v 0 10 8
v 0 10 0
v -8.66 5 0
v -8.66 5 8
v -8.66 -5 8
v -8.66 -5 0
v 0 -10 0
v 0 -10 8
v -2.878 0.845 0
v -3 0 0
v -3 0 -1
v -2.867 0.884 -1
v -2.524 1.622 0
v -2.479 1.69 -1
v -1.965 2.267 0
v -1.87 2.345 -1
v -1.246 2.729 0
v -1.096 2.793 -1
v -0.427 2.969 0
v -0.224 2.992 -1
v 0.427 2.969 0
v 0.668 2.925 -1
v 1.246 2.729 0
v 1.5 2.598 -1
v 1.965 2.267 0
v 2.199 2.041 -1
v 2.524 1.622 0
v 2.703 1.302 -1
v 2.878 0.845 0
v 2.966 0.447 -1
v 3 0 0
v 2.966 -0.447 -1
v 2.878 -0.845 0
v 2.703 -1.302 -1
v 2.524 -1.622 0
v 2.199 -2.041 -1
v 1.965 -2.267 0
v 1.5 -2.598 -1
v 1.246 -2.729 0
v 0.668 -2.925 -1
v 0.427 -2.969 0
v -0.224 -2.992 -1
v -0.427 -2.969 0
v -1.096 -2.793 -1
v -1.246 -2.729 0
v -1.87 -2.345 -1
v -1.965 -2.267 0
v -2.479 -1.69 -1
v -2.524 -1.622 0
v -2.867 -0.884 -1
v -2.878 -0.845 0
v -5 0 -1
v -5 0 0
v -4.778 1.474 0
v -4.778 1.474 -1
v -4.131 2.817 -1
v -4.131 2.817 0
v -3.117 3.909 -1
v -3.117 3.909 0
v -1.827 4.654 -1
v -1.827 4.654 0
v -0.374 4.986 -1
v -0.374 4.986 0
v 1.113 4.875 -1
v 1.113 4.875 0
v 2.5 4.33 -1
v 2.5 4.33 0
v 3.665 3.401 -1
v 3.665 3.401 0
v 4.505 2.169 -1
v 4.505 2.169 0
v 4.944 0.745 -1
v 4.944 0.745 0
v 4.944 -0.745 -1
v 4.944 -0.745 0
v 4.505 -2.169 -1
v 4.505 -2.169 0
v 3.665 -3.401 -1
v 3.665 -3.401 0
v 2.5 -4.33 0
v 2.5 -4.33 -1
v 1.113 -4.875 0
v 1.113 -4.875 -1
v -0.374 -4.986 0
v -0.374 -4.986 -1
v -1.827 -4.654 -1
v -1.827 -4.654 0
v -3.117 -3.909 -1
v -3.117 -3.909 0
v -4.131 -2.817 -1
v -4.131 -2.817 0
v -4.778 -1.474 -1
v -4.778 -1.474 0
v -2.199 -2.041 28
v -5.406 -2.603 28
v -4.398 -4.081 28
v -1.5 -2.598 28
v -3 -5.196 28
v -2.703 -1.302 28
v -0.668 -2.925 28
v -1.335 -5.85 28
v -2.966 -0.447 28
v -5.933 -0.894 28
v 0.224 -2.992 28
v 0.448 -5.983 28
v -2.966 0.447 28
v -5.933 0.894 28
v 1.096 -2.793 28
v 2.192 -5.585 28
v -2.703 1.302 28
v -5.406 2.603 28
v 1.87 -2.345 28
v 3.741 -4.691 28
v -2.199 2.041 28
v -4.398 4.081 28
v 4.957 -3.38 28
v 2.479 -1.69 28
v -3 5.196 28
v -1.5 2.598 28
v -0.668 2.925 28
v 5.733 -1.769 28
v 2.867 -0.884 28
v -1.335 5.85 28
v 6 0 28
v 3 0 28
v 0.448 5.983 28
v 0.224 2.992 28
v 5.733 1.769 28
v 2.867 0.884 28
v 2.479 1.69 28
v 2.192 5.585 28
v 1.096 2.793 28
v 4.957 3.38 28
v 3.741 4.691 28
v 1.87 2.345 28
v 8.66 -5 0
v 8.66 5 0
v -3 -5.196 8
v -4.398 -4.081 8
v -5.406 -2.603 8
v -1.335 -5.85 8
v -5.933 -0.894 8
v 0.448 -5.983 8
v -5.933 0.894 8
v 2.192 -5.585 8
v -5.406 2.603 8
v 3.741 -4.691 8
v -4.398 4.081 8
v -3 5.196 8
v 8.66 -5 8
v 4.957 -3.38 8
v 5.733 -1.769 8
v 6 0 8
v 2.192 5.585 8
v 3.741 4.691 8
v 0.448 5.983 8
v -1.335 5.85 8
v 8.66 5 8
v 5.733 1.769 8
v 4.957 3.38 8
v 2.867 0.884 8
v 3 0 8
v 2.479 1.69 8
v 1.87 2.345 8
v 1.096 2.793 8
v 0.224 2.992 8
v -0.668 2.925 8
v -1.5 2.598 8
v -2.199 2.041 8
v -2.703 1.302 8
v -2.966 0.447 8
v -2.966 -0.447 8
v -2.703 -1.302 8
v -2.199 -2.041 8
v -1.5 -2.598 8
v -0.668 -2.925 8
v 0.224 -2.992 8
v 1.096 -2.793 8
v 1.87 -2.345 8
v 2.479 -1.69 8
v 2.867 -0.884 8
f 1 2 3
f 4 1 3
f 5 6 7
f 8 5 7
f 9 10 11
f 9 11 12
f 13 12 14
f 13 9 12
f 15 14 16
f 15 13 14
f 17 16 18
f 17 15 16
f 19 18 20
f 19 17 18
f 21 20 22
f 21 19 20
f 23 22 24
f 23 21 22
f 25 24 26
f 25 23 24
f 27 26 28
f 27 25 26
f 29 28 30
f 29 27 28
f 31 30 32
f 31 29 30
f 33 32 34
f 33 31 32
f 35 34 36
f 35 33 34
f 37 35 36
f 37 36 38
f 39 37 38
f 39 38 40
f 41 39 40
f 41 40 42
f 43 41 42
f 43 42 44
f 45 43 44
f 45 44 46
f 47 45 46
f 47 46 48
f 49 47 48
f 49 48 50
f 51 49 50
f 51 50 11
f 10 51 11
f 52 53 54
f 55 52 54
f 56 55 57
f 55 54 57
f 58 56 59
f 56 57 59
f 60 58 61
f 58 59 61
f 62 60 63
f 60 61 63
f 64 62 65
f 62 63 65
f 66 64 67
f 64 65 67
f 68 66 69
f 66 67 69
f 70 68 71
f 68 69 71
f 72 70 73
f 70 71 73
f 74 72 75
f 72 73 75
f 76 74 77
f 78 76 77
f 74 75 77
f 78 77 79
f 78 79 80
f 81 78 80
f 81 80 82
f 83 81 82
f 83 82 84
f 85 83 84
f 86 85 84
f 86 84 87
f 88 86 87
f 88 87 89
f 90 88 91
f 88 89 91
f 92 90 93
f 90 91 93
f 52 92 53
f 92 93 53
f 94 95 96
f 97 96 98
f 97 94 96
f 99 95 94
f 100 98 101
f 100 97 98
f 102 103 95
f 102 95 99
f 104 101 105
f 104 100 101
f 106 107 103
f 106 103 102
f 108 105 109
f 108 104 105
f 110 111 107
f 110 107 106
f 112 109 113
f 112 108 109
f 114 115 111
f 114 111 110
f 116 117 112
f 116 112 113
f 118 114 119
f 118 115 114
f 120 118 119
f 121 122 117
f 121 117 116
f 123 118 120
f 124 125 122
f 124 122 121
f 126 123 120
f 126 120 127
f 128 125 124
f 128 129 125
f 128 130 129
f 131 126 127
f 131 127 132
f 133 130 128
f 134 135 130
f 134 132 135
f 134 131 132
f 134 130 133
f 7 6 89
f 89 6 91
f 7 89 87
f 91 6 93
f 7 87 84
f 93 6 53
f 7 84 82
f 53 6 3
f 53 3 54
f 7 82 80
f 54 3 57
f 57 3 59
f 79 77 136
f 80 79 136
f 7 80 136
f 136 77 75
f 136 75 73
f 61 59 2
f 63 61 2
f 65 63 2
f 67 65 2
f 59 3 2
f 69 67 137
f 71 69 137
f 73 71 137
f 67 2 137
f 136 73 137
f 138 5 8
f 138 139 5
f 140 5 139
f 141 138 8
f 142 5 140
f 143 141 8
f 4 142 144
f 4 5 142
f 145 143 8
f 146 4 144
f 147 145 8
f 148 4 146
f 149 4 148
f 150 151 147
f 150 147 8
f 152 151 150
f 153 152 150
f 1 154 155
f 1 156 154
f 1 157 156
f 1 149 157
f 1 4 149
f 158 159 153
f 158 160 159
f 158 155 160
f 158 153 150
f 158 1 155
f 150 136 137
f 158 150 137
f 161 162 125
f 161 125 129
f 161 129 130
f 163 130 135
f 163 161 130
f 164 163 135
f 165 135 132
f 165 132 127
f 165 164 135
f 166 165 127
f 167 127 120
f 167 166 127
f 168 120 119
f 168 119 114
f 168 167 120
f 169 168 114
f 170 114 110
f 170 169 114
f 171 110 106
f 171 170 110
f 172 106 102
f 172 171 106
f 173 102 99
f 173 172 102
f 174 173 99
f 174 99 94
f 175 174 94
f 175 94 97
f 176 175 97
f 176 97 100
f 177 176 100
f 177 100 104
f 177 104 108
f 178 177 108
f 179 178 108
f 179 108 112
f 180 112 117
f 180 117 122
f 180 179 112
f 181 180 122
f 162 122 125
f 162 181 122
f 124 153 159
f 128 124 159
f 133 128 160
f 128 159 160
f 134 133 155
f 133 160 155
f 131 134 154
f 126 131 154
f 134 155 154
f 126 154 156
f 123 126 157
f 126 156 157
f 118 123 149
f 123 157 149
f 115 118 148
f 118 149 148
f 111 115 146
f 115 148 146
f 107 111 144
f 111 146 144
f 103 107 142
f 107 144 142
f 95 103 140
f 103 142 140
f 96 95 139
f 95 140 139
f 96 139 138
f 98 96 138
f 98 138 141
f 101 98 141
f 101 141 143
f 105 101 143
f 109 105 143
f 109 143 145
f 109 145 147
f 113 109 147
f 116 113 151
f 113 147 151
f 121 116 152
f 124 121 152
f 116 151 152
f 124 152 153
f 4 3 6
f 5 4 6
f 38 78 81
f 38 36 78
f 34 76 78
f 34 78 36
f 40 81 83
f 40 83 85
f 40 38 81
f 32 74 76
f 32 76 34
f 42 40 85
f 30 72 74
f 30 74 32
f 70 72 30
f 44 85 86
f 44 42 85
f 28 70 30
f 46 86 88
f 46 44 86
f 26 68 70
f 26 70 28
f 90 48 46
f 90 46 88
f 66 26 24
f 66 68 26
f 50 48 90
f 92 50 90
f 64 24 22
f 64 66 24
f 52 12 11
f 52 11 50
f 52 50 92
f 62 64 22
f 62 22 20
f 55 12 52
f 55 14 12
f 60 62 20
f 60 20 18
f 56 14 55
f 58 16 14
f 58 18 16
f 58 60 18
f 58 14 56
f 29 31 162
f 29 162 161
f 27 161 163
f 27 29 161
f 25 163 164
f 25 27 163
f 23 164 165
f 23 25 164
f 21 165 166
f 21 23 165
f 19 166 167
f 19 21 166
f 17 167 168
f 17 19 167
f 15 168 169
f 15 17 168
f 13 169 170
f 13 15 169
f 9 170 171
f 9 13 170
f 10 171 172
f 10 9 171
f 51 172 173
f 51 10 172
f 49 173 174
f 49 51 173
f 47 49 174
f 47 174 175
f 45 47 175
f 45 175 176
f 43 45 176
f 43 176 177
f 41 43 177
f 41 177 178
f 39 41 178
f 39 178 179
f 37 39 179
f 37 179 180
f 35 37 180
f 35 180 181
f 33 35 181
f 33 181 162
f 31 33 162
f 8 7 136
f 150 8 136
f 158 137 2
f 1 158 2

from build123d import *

# Parameters (mm, degrees)
ESBO_O1_R                = 3
RESSALTO_EXTRUS_O1_DEPTH = 8
ESBO_O2_R                = 5
ESBO_O2_R_2              = 3
RESSALTO_EXTRUS_O2_DEPTH = 1
ESBO_O3_R                = 6
ESBO_O3_R_2              = 3
RESSALTO_EXTRUS_O3_DEPTH = 20


with BuildPart() as part:
    # Esboço1 → Ressalto-extrusão1 (new body)
    with BuildSketch(Plane.XY):
        Polygon((-8.660254038, 5), (-8.660254038, -5), (0, -10), (8.660254038, -5), (8.660254038, 5), (0, 10), align=None)
        Circle(ESBO_O1_R, mode=Mode.SUBTRACT)
    extrude(amount=RESSALTO_EXTRUS_O1_DEPTH)

    # Esboço2 → Ressalto-extrusão2 (add)
    with BuildSketch(Plane(origin=(0, 0, 0), x_dir=(-1, 0, 0), z_dir=(0, 0, -1))):
        Circle(ESBO_O2_R)
        Circle(ESBO_O2_R_2, mode=Mode.SUBTRACT)
    extrude(amount=RESSALTO_EXTRUS_O2_DEPTH)

    # Esboço3 → Ressalto-extrusão3 (add)
    with BuildSketch(Plane.XY.offset(8)):
        Circle(ESBO_O3_R)
        Circle(ESBO_O3_R_2, mode=Mode.SUBTRACT)
    extrude(amount=RESSALTO_EXTRUS_O3_DEPTH)


solid = part.part
